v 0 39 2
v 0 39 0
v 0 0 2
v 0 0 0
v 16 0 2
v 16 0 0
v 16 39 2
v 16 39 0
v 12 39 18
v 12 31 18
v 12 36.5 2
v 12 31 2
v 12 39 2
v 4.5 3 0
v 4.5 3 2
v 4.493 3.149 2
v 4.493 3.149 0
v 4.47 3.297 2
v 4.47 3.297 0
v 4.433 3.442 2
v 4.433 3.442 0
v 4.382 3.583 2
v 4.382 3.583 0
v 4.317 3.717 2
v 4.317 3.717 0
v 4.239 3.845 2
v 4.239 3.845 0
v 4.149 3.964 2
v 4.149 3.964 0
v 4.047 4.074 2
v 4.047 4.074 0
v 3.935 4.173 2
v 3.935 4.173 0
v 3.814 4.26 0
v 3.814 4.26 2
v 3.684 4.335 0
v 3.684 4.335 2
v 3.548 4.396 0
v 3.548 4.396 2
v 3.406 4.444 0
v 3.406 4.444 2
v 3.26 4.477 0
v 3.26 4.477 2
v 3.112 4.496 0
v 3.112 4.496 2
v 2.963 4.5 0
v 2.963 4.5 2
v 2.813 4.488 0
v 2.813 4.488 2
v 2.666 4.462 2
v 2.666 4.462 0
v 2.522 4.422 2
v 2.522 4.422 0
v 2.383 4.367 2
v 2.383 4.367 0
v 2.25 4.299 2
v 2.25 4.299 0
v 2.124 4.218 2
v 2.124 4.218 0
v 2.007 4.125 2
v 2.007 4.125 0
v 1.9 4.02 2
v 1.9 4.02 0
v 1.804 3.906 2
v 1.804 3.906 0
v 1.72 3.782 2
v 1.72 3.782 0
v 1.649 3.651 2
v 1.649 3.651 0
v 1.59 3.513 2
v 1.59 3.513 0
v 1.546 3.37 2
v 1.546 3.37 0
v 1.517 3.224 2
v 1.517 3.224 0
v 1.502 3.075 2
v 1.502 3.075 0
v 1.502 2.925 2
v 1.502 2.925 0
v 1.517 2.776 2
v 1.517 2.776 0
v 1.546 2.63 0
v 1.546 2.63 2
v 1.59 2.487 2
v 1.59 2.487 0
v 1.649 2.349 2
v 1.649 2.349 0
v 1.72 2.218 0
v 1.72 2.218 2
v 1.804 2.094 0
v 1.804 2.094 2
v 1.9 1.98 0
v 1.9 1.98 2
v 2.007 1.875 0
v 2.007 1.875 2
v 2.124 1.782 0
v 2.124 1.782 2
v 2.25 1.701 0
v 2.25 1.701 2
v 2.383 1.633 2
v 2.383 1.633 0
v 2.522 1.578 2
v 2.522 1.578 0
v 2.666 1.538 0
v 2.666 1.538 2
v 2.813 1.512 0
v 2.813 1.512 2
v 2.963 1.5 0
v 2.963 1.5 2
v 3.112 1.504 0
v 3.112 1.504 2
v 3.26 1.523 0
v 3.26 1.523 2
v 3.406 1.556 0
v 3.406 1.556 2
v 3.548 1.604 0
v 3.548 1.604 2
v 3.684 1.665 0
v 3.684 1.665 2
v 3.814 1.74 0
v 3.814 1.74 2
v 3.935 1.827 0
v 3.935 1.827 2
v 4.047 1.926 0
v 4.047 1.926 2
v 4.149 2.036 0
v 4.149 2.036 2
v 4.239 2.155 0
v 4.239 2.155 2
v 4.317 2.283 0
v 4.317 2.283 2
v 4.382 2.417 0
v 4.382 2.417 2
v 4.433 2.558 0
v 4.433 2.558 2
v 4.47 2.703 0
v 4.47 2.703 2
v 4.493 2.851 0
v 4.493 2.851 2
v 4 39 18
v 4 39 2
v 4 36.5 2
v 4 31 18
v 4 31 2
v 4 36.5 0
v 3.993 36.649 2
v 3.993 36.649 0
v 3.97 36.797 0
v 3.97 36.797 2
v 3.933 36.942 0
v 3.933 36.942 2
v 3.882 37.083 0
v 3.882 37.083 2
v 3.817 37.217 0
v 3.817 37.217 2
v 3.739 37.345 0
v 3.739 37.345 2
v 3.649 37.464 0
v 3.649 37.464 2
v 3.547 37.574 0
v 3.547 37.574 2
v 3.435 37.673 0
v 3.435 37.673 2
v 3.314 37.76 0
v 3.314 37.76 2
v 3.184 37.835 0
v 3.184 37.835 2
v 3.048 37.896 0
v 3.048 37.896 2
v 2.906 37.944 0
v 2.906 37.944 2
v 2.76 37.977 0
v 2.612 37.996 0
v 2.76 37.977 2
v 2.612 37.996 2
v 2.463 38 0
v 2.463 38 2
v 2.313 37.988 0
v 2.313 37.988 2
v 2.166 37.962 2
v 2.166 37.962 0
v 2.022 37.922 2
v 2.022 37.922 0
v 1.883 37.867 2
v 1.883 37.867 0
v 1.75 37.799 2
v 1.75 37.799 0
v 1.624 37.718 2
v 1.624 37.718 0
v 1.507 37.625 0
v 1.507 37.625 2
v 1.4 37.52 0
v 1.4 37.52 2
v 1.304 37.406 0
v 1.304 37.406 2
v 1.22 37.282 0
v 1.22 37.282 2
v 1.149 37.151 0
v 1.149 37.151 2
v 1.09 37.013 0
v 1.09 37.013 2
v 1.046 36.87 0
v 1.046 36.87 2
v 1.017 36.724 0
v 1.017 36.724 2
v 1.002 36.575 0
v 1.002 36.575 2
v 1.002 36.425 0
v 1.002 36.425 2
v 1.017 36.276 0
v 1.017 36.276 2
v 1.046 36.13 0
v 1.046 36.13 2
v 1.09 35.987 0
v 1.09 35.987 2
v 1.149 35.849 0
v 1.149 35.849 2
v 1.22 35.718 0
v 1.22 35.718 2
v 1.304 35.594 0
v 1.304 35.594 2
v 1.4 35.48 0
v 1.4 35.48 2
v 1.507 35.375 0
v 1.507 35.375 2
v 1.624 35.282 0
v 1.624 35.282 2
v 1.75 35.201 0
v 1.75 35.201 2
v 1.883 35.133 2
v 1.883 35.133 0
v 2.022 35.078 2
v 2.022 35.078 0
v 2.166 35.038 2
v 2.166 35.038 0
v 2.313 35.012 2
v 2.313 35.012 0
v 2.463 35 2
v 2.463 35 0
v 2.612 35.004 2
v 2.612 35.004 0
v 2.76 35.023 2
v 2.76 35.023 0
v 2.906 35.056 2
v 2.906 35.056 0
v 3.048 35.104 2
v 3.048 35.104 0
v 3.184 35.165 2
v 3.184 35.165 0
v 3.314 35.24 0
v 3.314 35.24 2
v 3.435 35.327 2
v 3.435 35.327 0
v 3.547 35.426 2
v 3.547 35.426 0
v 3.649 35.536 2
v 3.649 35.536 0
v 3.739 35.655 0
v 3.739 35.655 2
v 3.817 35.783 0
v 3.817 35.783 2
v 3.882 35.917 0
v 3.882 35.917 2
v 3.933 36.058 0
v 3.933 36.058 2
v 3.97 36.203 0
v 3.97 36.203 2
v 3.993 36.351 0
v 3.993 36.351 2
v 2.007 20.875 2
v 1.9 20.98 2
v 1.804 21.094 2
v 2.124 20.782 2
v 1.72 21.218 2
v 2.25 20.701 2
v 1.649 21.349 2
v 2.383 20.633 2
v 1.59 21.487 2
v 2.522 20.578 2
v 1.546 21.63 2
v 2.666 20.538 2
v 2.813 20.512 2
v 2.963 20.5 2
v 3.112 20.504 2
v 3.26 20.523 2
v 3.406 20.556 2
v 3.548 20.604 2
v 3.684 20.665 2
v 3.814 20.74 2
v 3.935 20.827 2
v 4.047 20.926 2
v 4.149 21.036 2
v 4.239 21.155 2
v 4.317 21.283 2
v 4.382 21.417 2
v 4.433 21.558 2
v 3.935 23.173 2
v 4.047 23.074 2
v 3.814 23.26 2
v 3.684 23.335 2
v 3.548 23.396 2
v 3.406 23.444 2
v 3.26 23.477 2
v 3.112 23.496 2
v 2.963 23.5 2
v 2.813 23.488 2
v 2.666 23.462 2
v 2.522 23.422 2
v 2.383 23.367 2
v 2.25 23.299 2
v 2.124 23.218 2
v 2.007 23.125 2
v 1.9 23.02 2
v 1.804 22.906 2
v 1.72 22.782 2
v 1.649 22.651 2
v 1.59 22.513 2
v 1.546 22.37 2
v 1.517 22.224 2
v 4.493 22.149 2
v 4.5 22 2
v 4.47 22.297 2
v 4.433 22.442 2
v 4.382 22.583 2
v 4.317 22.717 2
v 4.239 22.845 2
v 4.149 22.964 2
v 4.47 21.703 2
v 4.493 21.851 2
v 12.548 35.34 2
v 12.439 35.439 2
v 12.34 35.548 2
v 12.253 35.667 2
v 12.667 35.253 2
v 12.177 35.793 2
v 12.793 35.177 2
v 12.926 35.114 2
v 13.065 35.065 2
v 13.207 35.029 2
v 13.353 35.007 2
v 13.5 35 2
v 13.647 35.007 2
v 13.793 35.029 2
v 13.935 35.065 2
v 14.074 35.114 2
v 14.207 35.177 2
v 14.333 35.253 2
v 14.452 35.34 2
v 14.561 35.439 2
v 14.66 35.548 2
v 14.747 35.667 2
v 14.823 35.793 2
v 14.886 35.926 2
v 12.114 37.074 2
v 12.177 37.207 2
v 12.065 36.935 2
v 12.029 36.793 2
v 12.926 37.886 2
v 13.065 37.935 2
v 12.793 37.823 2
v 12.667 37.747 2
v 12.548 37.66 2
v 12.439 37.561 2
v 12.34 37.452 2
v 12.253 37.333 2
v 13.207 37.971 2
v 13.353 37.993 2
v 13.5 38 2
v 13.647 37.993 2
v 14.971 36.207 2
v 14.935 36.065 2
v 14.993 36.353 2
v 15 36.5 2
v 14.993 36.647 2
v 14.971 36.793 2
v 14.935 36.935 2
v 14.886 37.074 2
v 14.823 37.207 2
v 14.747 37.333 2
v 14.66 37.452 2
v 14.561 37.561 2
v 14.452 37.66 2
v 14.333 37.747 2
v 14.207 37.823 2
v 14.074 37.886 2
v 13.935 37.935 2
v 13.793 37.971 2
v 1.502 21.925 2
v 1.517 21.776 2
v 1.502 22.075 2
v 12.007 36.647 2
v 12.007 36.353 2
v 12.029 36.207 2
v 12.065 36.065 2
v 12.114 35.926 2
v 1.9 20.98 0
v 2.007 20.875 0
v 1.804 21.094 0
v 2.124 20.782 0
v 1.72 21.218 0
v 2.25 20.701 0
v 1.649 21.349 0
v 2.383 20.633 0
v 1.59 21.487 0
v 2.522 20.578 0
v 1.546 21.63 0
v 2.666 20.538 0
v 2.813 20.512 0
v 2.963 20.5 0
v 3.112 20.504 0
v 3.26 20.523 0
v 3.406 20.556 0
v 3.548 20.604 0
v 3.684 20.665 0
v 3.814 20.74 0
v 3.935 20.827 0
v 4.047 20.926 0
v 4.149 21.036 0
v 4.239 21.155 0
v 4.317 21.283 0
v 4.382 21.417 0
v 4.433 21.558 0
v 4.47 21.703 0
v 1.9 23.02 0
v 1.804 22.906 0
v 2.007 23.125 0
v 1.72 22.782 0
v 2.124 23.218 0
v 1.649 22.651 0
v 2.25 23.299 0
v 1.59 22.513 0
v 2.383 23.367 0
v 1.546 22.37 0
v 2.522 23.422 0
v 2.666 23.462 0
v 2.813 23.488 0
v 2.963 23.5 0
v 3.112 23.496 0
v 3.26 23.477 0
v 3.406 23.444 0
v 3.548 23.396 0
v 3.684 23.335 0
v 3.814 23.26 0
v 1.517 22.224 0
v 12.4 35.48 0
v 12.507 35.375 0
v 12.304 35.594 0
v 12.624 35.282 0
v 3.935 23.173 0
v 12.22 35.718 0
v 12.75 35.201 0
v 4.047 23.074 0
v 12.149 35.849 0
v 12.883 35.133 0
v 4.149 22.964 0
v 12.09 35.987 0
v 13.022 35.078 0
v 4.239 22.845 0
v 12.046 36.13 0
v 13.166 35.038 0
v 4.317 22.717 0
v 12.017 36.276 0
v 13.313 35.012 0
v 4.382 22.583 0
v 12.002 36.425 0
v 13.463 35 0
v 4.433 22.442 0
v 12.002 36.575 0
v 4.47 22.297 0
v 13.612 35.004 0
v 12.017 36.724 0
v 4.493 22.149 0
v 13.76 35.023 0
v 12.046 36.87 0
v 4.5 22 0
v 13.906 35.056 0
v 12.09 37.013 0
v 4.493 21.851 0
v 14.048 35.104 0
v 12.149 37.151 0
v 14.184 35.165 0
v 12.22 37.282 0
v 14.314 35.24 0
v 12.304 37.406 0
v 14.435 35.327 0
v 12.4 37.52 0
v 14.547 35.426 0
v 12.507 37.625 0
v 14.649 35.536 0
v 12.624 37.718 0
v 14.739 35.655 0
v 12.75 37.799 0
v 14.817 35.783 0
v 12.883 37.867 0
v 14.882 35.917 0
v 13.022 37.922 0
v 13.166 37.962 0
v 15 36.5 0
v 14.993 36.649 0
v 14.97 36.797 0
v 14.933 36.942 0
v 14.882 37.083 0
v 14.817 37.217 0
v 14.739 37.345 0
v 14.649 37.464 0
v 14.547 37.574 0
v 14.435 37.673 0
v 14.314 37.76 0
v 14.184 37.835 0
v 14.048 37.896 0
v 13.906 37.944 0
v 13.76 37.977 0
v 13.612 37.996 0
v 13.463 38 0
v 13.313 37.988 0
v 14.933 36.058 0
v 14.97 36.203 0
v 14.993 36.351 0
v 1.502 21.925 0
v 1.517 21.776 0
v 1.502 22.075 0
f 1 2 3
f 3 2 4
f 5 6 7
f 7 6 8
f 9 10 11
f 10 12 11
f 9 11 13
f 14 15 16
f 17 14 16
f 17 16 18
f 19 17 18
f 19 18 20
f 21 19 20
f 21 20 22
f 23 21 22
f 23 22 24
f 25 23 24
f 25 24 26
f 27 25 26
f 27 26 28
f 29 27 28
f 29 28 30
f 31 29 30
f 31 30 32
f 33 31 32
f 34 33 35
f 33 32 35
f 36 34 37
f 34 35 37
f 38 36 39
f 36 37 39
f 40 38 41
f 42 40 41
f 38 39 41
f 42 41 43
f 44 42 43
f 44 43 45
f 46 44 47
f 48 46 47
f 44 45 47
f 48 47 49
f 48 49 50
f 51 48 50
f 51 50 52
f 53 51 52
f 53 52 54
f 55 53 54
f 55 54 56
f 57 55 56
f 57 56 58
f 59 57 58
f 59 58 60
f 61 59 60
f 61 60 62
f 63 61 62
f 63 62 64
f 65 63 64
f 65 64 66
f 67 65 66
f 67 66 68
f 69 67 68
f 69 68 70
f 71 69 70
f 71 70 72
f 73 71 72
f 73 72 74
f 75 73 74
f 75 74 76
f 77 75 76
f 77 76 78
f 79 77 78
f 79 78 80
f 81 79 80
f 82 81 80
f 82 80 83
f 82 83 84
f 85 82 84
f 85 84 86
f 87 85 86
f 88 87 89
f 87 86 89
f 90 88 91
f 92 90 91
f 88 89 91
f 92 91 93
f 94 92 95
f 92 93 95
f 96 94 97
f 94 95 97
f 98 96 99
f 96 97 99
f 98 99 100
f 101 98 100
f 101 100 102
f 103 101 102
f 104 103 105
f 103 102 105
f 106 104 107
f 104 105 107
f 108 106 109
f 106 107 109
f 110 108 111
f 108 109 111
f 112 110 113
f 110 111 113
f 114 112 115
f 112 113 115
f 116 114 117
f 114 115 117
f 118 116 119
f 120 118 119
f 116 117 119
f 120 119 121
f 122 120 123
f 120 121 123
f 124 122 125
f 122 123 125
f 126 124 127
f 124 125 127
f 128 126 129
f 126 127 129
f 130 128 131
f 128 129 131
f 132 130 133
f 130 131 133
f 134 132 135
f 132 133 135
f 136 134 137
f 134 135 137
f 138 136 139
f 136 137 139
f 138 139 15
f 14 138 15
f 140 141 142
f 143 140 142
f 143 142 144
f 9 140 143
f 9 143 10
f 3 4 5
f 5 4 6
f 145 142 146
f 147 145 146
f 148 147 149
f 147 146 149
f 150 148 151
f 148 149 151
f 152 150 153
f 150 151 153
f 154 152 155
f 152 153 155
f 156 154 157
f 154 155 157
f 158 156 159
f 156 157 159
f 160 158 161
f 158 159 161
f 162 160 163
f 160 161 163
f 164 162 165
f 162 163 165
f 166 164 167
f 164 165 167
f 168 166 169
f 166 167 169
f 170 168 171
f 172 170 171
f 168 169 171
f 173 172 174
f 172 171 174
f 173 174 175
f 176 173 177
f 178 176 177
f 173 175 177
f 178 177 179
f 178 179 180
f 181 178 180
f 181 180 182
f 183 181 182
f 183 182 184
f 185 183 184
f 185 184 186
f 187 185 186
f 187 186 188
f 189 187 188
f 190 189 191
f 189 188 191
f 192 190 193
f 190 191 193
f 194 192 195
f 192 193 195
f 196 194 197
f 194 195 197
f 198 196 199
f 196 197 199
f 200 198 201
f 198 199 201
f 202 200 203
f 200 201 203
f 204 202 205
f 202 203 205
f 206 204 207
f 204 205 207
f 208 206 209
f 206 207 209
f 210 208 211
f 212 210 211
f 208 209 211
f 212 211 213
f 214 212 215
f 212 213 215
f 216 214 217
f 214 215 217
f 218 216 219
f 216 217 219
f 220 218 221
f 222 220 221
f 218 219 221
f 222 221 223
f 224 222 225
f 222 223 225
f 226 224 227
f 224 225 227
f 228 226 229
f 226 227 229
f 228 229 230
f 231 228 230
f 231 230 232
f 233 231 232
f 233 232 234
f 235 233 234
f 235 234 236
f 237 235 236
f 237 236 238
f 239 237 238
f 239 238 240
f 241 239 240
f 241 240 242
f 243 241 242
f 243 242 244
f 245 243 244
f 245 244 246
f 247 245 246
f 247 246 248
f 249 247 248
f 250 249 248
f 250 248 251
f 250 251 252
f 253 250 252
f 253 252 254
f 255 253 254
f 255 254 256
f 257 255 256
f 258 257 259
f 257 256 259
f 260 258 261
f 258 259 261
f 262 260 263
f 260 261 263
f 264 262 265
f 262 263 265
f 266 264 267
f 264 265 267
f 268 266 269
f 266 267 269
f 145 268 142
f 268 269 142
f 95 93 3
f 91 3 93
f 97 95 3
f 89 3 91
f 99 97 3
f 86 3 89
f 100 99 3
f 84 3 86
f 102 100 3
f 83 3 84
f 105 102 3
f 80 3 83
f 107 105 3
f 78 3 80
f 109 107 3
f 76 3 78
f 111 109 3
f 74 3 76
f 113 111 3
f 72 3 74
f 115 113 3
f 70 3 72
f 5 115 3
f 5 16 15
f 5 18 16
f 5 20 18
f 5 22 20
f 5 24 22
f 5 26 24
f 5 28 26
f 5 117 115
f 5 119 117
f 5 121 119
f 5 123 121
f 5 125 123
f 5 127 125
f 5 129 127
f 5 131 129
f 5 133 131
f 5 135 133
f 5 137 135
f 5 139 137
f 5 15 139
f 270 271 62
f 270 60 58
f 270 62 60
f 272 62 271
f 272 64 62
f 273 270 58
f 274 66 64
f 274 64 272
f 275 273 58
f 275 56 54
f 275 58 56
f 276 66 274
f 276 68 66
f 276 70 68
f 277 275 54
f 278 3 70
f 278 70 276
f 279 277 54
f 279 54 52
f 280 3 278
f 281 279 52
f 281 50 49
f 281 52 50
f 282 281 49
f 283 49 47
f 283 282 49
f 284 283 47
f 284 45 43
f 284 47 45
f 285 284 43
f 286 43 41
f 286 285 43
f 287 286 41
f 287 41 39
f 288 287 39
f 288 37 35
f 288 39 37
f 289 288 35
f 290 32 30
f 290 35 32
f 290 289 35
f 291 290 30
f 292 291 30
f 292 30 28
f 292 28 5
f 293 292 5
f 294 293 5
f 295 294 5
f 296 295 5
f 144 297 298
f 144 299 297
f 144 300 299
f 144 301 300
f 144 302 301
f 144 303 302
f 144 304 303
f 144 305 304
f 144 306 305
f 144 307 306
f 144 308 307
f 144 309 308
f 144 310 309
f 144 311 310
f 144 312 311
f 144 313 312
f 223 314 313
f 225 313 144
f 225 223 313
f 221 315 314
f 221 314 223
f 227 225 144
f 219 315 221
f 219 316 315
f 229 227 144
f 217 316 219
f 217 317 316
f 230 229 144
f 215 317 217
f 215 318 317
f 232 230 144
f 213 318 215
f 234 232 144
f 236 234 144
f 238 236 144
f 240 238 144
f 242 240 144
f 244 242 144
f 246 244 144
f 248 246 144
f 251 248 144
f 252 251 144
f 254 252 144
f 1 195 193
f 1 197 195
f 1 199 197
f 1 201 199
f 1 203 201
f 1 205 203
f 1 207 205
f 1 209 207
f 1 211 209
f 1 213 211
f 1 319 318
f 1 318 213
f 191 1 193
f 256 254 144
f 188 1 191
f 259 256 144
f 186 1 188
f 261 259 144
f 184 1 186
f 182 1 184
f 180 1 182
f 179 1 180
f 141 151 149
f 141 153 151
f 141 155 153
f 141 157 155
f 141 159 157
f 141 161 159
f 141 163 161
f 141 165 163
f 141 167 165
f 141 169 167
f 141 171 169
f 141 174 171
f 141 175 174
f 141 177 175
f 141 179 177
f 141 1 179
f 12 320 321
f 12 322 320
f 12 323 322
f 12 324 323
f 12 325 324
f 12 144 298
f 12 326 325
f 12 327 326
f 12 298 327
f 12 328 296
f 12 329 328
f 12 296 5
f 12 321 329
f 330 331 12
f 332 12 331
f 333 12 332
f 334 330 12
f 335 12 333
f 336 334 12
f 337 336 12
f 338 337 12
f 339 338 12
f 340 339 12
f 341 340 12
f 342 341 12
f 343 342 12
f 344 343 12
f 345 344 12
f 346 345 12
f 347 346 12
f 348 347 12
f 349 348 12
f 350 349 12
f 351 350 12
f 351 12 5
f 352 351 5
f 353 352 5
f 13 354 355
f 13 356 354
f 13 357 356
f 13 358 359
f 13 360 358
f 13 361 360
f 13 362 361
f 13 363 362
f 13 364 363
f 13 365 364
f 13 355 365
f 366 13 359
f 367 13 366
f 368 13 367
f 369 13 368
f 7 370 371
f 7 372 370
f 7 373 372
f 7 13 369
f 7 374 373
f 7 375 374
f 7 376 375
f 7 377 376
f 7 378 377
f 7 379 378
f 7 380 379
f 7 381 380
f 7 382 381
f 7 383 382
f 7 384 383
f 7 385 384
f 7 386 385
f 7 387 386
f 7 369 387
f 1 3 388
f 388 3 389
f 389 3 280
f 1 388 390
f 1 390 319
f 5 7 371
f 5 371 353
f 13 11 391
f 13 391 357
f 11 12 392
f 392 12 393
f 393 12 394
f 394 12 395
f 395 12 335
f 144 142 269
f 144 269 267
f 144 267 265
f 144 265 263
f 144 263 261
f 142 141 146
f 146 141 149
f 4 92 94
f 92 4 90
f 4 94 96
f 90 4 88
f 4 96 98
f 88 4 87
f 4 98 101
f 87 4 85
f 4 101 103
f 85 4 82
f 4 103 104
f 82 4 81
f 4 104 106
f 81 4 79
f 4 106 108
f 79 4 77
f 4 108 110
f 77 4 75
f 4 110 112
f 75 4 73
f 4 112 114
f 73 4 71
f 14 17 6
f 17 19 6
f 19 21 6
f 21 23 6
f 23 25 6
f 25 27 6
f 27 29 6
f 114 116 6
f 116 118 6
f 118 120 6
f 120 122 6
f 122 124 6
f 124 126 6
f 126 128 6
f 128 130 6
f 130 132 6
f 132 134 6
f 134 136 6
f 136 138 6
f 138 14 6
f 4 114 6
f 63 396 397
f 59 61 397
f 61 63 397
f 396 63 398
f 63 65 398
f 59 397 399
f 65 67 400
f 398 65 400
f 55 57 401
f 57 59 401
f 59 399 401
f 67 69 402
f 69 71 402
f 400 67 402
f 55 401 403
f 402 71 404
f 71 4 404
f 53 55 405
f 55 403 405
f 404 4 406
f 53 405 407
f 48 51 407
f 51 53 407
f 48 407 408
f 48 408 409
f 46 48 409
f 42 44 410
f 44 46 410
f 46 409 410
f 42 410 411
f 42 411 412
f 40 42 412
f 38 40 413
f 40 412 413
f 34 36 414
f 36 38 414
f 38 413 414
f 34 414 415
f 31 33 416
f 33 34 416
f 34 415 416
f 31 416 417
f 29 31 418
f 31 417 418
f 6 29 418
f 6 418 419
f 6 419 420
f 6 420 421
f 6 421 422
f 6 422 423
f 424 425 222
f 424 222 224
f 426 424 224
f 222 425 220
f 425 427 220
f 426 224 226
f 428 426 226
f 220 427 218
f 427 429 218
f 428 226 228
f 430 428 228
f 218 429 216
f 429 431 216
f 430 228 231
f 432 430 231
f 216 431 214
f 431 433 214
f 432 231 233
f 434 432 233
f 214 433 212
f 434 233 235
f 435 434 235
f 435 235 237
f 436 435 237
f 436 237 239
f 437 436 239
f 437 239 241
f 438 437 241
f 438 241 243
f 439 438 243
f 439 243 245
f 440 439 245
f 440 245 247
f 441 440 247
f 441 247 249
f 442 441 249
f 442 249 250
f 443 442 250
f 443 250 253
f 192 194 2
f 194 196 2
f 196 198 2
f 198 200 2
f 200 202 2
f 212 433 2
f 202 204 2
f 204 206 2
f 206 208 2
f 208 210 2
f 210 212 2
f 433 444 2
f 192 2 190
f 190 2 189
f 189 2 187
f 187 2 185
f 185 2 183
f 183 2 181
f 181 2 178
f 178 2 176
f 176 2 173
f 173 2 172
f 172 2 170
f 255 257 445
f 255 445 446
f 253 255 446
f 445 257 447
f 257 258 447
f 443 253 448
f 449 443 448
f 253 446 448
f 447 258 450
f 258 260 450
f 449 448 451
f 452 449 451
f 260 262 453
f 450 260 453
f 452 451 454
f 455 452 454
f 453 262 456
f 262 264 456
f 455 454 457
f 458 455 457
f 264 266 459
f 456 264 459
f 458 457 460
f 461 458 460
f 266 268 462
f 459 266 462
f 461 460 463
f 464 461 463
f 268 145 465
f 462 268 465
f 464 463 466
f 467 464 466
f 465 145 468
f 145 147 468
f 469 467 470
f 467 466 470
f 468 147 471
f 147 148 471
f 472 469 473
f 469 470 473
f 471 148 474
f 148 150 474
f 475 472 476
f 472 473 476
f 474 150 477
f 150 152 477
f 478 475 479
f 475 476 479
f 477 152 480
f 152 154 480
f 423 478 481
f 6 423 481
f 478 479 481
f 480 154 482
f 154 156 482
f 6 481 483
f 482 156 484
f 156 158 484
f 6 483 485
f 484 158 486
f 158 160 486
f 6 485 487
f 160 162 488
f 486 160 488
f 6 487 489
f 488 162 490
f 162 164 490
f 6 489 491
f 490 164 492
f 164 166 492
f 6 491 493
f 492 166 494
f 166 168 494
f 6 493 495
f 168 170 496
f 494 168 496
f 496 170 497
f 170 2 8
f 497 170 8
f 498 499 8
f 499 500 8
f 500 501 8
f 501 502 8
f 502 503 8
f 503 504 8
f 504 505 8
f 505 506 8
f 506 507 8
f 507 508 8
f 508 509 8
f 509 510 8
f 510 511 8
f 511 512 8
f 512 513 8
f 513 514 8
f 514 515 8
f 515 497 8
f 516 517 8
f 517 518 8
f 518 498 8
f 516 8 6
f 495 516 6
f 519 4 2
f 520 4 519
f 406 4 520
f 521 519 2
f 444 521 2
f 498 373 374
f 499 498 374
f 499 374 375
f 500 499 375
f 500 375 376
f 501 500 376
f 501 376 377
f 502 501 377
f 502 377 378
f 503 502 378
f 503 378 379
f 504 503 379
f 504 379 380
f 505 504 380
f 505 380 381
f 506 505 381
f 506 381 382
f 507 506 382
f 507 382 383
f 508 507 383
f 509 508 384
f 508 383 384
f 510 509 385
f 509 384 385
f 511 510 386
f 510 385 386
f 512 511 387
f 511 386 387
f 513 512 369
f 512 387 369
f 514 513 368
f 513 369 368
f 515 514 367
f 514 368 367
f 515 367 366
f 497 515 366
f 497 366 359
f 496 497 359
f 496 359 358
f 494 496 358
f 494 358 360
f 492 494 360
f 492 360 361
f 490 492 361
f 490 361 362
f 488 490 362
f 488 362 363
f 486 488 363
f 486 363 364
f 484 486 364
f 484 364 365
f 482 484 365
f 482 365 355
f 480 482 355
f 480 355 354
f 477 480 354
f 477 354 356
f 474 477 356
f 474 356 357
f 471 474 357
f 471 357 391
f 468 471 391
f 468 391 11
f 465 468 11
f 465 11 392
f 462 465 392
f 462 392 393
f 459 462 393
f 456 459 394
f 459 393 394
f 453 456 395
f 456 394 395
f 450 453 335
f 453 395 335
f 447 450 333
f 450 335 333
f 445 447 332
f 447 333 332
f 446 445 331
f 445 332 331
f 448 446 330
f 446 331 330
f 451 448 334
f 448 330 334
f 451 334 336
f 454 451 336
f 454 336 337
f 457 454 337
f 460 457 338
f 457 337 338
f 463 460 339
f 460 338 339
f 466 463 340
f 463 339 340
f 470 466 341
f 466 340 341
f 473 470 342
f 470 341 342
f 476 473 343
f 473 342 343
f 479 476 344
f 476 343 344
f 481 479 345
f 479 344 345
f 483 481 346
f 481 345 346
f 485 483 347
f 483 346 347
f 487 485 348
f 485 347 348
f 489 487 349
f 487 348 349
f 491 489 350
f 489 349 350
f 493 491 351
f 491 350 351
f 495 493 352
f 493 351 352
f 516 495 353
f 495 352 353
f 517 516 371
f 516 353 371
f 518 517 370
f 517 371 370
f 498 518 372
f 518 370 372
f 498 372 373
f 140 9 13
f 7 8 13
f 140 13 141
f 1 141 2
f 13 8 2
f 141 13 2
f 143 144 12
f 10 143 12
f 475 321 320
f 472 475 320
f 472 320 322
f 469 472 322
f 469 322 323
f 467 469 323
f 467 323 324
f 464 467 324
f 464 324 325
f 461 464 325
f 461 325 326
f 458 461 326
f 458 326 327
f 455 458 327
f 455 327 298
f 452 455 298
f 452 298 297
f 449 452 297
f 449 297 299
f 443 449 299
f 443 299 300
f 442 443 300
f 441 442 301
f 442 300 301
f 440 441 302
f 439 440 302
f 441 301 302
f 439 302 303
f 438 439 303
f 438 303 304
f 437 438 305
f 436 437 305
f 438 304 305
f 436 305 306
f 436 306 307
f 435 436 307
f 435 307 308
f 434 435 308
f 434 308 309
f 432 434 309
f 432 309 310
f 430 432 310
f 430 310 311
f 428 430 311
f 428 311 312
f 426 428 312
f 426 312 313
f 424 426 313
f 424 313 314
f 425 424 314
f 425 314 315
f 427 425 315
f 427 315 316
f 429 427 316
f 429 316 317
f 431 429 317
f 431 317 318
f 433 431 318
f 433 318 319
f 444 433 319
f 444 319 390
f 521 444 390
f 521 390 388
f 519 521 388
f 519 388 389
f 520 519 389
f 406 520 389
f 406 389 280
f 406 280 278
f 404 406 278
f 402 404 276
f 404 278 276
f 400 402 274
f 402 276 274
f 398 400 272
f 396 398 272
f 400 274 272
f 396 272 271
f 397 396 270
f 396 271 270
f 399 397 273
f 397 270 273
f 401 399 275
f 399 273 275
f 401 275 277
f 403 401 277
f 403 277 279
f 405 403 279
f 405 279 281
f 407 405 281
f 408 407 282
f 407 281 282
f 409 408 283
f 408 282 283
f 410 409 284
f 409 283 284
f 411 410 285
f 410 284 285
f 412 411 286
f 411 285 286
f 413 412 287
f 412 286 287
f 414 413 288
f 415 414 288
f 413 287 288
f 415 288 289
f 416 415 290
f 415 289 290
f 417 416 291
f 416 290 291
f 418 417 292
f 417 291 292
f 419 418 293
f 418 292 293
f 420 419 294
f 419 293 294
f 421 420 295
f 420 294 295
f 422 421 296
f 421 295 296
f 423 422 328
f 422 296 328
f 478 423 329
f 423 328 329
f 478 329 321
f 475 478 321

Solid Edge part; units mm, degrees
sketch "Sketch1" plane through (0, 0, 0) normal (0, 0, 1) x (1, 0, 0)
  line L0 (0, 0) -> (16, 0)
  line L1 (16, 0) -> (16, 39)
  line L2 (16, 39) -> (0, 39)
  line L3 (0, 39) -> (0, 0)
  dimension "D1" = 16
  dimension "D2" = 39
extrude "Protrusion1" add sketch "Sketch1" along normal blind 2
sketch "Sketch2" plane through (8, 19.5, 2) normal (0, 0, 1) x (1, 0, 0)
  circle A0 centre (-5, 2.5) radius 1.5
  circle A1 centre (-5.5, 17) radius 1.5
  circle A2 centre (5.5, 17) radius 1.5
  circle A3 centre (-5, -16.5) radius 1.5
  dimension "D1" = 3
  dimension "D2" = 22
  dimension "D3" = 3
  dimension "D4" = 2.5
  dimension "D5" = 2.5
  dimension "D6" = 2.5
  dimension "D7" = 11
extrude "Cutout1" cut sketch "Sketch2" against normal through all
sketch "Sketch3" plane through (8, 19.5, 2) normal (0, 0, 1) x (1, 0, 0)
  line L0 (-4, 11.5) -> (4, 11.5)
  line L1 (4, 11.5) -> (4, 19.5)
  line L2 (4, 19.5) -> (-4, 19.5)
  line L3 (-4, 19.5) -> (-4, 11.5)
  dimension "D1" = 8
  dimension "D2" = 8
extrude "ExtrudedProtrusion_2" add sketch "Sketch3" along normal blind 16
